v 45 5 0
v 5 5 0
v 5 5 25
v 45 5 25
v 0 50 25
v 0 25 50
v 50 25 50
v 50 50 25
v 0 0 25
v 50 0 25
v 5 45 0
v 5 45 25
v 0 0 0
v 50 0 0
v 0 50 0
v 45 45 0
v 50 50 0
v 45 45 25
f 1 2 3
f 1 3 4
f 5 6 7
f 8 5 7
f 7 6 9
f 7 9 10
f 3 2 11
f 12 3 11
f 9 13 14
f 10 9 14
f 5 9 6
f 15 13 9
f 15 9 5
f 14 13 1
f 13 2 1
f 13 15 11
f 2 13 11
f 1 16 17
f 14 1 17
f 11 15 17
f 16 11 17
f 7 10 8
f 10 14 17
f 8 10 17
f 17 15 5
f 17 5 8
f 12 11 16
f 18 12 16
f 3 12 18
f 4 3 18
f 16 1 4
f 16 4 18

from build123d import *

# Parameters (mm, degrees)
F0_W     = 50
F0_H     = 50
F0_W_2   = 40
F0_H_2   = 40
F1_DEPTH = 25
F2_W     = 50
F2_H     = 50
F2_W_2   = 40
F2_H_2   = 40
F3_DEPTH = 25
F4_SIZE  = 24.99999


# Not quite as in the source:
# - a fillet or chamfer is up to 0.001 mm smaller than in the source, because OpenCascade refuses the exact size


with BuildPart() as f1:
    # F0 (on Top) → F1 (new body)
    with BuildSketch(Plane.XY):
        with Locations((25, 25)):
            Rectangle(F0_W, F0_H)
        with Locations((25, 25)):
            Rectangle(F0_W_2, F0_H_2, mode=Mode.SUBTRACT)
    extrude(amount=F1_DEPTH)

    # F2 (on face) → F3 (join)
    with BuildSketch(Plane.XY.offset(25)):
        with Locations((25, 25)):
            Rectangle(F2_W, F2_H)
        with Locations((25, 25)):
            Rectangle(F2_W_2, F2_H_2, mode=Mode.SUBTRACT)
        with Locations((25, 25)):
            Rectangle(F2_W_2, F2_H_2)
    extrude(amount=F3_DEPTH)

    # F4 (size 25 in the source; OpenCascade refuses exactly that, so slightly less here)
    f4_edges = [f1.edges().sort_by_distance(p)[0] for p in [
        (25, 0, 50),
        (25, 50, 50),
    ]]
    chamfer(f4_edges, length=F4_SIZE)


solid = f1.part
